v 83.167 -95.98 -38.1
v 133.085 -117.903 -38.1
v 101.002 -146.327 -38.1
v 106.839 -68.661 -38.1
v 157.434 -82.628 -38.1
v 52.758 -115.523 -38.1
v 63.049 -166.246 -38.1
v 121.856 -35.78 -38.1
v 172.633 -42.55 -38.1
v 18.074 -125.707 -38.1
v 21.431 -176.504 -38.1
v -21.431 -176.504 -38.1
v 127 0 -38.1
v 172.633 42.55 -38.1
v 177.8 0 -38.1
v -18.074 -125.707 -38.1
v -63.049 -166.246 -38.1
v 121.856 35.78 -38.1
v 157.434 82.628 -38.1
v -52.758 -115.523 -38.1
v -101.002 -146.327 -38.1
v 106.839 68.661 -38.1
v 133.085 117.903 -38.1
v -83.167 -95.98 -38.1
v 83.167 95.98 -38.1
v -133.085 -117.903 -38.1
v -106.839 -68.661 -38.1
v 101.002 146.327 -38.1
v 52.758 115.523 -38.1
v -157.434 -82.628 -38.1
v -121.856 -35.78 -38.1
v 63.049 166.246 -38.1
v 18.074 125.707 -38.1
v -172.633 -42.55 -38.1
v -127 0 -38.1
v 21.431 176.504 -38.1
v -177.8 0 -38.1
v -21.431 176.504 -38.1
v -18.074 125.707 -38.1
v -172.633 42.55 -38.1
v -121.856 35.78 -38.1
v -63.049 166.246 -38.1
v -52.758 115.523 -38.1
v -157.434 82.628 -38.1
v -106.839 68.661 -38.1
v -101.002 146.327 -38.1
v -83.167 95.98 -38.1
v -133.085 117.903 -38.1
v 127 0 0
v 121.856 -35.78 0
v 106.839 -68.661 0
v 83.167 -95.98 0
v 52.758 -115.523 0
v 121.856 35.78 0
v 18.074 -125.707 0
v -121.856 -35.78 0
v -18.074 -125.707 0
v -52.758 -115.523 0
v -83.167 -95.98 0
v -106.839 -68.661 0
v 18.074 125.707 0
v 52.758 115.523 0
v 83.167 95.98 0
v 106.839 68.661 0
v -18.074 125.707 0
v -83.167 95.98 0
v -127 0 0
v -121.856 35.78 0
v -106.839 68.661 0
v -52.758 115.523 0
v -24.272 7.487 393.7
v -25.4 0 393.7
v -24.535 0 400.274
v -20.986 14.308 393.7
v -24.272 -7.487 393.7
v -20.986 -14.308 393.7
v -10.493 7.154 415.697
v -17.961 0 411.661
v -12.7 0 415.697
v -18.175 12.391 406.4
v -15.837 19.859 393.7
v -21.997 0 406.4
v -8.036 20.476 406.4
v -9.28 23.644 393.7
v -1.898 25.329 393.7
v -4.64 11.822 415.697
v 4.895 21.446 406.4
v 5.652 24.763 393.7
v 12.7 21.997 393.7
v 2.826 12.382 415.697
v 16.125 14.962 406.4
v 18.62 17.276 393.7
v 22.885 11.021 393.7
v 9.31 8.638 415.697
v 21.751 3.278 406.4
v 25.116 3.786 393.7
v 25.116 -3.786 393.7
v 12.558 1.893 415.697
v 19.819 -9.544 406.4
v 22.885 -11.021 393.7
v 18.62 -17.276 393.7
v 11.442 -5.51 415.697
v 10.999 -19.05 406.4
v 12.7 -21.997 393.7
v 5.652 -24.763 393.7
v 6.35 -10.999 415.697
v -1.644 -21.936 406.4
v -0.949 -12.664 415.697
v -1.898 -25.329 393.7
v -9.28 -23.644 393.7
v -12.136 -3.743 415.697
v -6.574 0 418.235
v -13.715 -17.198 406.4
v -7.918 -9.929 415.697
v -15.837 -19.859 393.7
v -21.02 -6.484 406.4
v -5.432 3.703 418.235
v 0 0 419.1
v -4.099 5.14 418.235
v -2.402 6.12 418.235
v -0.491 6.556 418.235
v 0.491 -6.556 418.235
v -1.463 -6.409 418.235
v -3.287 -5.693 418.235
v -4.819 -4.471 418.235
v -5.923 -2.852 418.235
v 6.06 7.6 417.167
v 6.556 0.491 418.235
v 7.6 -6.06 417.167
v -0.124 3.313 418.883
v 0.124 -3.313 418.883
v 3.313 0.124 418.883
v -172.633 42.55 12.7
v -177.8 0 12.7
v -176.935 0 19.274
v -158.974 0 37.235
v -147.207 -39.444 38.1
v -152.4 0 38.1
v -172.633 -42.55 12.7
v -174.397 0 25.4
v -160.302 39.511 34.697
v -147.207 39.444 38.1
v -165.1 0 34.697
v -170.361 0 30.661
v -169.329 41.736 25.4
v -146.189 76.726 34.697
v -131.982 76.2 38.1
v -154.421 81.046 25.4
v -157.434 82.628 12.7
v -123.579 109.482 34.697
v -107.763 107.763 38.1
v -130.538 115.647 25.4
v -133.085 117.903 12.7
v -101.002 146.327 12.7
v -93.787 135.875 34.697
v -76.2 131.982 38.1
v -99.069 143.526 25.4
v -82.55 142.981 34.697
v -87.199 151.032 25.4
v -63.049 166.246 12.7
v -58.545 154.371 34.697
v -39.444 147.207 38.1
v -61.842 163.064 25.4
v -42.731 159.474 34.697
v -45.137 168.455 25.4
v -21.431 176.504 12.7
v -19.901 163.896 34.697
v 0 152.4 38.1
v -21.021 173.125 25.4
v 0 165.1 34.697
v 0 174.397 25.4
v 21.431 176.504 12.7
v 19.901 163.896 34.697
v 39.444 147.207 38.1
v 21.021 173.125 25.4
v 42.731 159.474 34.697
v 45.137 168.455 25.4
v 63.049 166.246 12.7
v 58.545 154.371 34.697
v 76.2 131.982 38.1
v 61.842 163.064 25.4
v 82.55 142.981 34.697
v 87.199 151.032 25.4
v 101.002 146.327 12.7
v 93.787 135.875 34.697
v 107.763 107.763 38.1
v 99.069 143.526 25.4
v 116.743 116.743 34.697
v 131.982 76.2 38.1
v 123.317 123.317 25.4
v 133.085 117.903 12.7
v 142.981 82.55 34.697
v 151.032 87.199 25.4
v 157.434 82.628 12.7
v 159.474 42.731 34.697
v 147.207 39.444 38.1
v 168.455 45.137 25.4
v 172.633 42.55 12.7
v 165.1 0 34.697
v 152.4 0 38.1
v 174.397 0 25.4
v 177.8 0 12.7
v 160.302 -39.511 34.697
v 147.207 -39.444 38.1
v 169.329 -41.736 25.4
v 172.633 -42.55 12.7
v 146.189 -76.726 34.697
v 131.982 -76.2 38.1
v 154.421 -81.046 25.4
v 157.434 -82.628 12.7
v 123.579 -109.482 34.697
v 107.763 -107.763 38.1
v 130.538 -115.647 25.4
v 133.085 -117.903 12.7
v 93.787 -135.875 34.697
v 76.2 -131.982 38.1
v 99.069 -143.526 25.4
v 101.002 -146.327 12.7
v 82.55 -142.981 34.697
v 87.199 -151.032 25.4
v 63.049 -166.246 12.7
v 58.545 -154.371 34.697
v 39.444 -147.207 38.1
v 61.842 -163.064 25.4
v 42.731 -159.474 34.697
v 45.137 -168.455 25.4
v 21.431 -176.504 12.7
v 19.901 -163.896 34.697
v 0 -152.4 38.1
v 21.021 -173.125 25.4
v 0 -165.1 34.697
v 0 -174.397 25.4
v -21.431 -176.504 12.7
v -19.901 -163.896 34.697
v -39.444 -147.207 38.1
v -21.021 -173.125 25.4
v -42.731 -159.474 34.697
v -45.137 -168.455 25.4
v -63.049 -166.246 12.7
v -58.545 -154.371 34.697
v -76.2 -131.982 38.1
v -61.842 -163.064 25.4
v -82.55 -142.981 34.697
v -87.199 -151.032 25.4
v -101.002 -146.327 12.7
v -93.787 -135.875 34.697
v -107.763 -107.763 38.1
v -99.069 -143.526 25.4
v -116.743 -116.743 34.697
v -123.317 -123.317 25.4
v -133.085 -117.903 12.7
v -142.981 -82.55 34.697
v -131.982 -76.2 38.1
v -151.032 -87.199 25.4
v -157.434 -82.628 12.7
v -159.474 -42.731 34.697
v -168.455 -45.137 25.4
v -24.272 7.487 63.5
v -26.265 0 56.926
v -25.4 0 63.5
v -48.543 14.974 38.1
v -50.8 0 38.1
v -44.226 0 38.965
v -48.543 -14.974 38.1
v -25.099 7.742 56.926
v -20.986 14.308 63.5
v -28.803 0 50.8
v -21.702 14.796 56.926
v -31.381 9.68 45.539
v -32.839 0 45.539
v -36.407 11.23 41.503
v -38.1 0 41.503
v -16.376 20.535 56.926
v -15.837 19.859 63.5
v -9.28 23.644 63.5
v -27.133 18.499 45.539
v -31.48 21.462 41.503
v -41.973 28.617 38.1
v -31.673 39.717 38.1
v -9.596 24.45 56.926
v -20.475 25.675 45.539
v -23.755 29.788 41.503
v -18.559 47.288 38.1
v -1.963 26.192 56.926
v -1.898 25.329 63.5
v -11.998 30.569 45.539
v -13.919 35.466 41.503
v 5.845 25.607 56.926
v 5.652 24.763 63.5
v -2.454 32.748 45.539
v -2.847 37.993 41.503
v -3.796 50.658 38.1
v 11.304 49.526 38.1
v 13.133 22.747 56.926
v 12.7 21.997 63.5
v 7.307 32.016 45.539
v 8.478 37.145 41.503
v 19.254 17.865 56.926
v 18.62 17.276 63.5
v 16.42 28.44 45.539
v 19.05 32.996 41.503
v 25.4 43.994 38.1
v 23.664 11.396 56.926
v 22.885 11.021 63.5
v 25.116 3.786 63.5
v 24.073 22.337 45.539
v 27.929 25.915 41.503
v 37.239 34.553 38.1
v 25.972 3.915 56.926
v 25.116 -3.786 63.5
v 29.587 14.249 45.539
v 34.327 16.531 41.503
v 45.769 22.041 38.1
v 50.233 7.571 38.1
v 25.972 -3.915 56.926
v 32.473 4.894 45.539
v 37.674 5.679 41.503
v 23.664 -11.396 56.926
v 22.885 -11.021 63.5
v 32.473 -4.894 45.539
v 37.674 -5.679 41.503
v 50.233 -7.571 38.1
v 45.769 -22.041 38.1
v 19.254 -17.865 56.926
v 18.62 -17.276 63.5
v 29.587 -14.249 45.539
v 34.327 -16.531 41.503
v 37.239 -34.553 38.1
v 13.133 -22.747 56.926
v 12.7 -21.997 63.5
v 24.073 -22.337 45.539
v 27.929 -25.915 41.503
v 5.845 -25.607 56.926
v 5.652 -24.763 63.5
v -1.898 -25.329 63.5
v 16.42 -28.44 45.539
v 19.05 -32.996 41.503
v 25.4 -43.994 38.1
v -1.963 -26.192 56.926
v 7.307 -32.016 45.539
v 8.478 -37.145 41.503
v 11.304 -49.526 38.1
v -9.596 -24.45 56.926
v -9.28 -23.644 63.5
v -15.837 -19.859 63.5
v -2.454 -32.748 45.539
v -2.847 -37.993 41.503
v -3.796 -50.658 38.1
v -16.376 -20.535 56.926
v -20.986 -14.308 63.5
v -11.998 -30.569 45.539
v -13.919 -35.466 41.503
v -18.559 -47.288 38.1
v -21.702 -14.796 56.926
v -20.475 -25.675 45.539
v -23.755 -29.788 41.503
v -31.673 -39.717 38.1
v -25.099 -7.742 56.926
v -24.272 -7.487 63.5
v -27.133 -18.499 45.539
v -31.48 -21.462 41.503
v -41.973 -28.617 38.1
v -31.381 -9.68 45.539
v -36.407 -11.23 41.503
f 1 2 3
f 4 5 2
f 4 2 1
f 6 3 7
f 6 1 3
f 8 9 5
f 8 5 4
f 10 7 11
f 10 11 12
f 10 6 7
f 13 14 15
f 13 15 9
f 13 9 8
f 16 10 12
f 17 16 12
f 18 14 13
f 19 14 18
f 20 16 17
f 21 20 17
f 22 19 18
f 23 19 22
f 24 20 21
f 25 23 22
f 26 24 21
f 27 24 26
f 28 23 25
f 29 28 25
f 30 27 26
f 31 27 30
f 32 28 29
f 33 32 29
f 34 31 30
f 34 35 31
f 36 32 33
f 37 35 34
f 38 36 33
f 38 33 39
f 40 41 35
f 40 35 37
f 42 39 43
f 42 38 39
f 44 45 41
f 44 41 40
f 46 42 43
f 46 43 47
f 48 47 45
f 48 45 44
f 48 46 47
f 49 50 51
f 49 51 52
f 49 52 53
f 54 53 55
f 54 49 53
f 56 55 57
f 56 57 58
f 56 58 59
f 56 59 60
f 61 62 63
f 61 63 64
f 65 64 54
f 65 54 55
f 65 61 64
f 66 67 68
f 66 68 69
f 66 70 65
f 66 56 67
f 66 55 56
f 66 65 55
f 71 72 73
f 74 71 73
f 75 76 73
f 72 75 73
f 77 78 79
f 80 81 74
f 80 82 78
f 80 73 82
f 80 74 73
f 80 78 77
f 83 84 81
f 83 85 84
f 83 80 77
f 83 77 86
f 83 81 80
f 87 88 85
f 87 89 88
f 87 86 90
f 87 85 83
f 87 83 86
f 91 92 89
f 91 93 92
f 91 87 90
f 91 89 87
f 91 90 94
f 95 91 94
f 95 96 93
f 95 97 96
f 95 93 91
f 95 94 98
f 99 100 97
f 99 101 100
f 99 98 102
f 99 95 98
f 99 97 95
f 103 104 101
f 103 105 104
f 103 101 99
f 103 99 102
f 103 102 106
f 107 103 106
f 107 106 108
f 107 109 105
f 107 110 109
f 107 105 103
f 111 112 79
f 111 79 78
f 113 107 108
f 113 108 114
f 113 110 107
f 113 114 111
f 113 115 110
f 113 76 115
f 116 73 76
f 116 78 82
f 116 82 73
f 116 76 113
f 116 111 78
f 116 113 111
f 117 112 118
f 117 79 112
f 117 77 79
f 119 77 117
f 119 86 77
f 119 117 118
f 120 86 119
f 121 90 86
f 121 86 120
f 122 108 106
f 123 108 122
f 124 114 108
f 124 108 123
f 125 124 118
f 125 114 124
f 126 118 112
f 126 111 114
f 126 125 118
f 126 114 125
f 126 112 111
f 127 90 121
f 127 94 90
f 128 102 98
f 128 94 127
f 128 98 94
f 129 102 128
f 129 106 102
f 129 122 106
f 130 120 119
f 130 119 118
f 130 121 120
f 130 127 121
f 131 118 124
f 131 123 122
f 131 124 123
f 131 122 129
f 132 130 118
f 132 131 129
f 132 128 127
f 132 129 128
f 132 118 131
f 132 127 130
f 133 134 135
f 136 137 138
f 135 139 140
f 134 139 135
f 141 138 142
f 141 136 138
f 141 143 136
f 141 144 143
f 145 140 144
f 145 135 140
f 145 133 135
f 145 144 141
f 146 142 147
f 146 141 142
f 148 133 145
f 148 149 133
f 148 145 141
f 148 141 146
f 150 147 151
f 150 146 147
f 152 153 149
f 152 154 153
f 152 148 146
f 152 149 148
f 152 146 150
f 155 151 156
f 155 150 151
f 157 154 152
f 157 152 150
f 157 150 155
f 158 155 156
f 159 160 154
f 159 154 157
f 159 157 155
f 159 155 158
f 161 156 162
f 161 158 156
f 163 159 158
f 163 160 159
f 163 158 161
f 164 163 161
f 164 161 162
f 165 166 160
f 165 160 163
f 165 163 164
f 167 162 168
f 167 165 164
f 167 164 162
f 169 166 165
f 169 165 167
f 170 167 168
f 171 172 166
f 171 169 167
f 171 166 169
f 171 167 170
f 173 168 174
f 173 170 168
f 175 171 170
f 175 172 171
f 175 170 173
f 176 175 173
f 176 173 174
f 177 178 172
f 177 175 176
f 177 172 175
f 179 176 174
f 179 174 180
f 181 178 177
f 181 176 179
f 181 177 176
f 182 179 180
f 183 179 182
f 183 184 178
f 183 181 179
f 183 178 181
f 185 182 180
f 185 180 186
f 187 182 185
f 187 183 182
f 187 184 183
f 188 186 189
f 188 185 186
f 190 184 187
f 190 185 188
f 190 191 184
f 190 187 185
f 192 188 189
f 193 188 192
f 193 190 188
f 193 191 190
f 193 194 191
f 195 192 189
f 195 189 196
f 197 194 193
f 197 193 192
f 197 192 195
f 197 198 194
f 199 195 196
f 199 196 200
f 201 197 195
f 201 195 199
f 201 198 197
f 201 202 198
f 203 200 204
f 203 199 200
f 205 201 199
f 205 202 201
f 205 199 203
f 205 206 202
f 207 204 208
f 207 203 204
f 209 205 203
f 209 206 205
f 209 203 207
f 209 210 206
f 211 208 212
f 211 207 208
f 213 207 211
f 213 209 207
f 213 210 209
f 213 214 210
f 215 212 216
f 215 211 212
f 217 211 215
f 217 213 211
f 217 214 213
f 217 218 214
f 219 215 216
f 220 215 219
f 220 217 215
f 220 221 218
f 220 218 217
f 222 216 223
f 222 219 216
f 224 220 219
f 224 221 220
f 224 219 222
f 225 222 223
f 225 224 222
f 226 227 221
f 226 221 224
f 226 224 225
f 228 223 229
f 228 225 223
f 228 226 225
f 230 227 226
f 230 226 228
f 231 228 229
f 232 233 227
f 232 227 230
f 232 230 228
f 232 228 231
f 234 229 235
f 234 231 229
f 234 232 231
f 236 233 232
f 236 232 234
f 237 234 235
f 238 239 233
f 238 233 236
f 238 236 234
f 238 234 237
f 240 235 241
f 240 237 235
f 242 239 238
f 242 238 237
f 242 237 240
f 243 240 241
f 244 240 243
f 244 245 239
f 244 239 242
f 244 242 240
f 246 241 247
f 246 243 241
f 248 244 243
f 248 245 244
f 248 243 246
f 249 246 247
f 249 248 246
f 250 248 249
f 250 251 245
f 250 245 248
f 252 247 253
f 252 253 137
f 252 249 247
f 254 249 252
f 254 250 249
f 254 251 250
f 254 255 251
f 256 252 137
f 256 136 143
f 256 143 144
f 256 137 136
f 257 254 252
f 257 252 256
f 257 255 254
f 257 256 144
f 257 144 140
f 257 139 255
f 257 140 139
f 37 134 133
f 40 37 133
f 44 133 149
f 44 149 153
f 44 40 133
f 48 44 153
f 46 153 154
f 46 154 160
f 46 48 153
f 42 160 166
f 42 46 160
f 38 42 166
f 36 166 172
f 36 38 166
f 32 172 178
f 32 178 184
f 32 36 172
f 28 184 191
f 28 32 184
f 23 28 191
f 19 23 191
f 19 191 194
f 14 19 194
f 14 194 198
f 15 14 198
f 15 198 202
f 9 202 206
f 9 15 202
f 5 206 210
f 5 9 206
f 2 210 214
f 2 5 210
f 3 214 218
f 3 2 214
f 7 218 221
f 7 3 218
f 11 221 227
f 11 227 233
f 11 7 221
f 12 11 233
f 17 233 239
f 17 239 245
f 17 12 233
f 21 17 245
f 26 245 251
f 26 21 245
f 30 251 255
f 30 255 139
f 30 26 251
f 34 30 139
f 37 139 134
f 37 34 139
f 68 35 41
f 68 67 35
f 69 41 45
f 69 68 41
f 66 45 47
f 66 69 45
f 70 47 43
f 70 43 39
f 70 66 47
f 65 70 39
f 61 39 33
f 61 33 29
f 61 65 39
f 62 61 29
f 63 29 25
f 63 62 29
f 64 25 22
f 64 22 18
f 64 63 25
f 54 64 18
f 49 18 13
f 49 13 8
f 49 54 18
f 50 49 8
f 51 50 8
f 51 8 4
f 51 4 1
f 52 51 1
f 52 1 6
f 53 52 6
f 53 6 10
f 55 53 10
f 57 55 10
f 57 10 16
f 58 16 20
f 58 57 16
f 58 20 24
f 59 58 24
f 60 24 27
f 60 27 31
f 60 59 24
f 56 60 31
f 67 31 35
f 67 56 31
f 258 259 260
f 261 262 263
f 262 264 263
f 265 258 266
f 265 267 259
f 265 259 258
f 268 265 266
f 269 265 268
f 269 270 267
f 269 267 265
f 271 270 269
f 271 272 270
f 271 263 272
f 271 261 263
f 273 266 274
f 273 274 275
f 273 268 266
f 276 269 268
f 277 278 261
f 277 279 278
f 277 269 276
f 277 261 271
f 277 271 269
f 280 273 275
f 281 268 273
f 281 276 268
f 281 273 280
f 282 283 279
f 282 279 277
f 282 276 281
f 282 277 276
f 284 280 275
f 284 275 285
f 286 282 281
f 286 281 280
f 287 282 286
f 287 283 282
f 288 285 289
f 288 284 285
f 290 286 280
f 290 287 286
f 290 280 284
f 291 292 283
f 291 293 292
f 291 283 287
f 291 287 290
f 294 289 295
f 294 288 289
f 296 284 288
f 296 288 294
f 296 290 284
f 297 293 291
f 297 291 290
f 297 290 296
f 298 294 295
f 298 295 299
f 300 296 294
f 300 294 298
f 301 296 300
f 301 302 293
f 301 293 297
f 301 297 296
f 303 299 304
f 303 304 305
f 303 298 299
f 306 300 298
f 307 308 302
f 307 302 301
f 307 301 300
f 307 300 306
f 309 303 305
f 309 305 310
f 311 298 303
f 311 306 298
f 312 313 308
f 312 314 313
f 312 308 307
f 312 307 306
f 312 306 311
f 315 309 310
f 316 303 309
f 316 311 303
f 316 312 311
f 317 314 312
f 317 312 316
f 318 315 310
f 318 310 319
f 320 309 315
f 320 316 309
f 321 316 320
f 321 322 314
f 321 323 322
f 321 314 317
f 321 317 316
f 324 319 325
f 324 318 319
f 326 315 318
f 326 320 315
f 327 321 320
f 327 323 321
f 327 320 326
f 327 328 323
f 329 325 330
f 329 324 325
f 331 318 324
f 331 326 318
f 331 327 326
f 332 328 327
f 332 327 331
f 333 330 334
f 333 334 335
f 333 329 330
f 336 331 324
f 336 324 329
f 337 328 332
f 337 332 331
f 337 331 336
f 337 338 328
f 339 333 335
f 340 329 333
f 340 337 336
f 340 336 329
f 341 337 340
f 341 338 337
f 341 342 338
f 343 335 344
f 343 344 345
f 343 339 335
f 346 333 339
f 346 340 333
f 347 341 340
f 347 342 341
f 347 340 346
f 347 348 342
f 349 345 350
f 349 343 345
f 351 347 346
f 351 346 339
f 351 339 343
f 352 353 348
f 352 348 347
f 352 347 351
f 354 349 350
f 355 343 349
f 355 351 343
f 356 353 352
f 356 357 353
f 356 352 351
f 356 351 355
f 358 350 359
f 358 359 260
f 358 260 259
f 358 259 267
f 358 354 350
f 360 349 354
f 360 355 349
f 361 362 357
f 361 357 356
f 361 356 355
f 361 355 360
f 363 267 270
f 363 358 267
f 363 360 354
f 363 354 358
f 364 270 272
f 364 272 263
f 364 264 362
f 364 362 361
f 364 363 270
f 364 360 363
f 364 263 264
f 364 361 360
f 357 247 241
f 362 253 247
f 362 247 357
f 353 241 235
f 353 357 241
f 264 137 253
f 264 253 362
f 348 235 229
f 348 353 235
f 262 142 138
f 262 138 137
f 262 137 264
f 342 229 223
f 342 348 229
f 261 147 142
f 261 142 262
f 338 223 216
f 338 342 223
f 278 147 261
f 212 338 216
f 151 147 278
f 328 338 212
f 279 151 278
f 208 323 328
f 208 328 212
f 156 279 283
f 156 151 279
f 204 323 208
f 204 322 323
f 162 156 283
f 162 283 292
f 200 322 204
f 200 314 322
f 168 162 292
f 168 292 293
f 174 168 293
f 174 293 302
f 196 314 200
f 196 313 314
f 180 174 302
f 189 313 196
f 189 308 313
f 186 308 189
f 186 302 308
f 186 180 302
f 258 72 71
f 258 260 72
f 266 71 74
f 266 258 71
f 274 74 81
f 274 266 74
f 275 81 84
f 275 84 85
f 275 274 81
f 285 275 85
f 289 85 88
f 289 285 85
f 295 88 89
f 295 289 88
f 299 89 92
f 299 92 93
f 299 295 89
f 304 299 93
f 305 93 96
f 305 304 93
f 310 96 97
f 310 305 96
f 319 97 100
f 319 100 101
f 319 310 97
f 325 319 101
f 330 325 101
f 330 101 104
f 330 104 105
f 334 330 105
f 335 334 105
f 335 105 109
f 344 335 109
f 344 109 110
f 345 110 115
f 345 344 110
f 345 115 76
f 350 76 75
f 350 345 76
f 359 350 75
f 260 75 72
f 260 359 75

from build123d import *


with BuildPart() as f1:
    # F0 (on Front) → F1 (revolve)
    with BuildSketch(Plane.XZ):
        with BuildLine():
            Line((-127, 0), (0, 0))
            Line((0, 0), (0, 419.1))
            ThreePointArc((0, 419.1), (-17.960512, 411.660512), (-25.4, 393.7))
            Line((-25.4, 393.7), (-25.4, 63.5))
            ThreePointArc((-25.4, 63.5), (-32.839488, 45.539488), (-50.8, 38.1))
            Line((-50.8, 38.1), (-152.4, 38.1))
            ThreePointArc((-152.4, 38.1), (-170.360512, 30.660512), (-177.8, 12.7))
            Line((-177.8, 12.7), (-177.8, -38.1))
            Line((-177.8, -38.1), (-127, -38.1))
            Line((-127, -38.1), (-127, 0))
        make_face()
    revolve(axis=Axis((0, 0, 209.55), (0, 0, -1)))


solid = f1.part
